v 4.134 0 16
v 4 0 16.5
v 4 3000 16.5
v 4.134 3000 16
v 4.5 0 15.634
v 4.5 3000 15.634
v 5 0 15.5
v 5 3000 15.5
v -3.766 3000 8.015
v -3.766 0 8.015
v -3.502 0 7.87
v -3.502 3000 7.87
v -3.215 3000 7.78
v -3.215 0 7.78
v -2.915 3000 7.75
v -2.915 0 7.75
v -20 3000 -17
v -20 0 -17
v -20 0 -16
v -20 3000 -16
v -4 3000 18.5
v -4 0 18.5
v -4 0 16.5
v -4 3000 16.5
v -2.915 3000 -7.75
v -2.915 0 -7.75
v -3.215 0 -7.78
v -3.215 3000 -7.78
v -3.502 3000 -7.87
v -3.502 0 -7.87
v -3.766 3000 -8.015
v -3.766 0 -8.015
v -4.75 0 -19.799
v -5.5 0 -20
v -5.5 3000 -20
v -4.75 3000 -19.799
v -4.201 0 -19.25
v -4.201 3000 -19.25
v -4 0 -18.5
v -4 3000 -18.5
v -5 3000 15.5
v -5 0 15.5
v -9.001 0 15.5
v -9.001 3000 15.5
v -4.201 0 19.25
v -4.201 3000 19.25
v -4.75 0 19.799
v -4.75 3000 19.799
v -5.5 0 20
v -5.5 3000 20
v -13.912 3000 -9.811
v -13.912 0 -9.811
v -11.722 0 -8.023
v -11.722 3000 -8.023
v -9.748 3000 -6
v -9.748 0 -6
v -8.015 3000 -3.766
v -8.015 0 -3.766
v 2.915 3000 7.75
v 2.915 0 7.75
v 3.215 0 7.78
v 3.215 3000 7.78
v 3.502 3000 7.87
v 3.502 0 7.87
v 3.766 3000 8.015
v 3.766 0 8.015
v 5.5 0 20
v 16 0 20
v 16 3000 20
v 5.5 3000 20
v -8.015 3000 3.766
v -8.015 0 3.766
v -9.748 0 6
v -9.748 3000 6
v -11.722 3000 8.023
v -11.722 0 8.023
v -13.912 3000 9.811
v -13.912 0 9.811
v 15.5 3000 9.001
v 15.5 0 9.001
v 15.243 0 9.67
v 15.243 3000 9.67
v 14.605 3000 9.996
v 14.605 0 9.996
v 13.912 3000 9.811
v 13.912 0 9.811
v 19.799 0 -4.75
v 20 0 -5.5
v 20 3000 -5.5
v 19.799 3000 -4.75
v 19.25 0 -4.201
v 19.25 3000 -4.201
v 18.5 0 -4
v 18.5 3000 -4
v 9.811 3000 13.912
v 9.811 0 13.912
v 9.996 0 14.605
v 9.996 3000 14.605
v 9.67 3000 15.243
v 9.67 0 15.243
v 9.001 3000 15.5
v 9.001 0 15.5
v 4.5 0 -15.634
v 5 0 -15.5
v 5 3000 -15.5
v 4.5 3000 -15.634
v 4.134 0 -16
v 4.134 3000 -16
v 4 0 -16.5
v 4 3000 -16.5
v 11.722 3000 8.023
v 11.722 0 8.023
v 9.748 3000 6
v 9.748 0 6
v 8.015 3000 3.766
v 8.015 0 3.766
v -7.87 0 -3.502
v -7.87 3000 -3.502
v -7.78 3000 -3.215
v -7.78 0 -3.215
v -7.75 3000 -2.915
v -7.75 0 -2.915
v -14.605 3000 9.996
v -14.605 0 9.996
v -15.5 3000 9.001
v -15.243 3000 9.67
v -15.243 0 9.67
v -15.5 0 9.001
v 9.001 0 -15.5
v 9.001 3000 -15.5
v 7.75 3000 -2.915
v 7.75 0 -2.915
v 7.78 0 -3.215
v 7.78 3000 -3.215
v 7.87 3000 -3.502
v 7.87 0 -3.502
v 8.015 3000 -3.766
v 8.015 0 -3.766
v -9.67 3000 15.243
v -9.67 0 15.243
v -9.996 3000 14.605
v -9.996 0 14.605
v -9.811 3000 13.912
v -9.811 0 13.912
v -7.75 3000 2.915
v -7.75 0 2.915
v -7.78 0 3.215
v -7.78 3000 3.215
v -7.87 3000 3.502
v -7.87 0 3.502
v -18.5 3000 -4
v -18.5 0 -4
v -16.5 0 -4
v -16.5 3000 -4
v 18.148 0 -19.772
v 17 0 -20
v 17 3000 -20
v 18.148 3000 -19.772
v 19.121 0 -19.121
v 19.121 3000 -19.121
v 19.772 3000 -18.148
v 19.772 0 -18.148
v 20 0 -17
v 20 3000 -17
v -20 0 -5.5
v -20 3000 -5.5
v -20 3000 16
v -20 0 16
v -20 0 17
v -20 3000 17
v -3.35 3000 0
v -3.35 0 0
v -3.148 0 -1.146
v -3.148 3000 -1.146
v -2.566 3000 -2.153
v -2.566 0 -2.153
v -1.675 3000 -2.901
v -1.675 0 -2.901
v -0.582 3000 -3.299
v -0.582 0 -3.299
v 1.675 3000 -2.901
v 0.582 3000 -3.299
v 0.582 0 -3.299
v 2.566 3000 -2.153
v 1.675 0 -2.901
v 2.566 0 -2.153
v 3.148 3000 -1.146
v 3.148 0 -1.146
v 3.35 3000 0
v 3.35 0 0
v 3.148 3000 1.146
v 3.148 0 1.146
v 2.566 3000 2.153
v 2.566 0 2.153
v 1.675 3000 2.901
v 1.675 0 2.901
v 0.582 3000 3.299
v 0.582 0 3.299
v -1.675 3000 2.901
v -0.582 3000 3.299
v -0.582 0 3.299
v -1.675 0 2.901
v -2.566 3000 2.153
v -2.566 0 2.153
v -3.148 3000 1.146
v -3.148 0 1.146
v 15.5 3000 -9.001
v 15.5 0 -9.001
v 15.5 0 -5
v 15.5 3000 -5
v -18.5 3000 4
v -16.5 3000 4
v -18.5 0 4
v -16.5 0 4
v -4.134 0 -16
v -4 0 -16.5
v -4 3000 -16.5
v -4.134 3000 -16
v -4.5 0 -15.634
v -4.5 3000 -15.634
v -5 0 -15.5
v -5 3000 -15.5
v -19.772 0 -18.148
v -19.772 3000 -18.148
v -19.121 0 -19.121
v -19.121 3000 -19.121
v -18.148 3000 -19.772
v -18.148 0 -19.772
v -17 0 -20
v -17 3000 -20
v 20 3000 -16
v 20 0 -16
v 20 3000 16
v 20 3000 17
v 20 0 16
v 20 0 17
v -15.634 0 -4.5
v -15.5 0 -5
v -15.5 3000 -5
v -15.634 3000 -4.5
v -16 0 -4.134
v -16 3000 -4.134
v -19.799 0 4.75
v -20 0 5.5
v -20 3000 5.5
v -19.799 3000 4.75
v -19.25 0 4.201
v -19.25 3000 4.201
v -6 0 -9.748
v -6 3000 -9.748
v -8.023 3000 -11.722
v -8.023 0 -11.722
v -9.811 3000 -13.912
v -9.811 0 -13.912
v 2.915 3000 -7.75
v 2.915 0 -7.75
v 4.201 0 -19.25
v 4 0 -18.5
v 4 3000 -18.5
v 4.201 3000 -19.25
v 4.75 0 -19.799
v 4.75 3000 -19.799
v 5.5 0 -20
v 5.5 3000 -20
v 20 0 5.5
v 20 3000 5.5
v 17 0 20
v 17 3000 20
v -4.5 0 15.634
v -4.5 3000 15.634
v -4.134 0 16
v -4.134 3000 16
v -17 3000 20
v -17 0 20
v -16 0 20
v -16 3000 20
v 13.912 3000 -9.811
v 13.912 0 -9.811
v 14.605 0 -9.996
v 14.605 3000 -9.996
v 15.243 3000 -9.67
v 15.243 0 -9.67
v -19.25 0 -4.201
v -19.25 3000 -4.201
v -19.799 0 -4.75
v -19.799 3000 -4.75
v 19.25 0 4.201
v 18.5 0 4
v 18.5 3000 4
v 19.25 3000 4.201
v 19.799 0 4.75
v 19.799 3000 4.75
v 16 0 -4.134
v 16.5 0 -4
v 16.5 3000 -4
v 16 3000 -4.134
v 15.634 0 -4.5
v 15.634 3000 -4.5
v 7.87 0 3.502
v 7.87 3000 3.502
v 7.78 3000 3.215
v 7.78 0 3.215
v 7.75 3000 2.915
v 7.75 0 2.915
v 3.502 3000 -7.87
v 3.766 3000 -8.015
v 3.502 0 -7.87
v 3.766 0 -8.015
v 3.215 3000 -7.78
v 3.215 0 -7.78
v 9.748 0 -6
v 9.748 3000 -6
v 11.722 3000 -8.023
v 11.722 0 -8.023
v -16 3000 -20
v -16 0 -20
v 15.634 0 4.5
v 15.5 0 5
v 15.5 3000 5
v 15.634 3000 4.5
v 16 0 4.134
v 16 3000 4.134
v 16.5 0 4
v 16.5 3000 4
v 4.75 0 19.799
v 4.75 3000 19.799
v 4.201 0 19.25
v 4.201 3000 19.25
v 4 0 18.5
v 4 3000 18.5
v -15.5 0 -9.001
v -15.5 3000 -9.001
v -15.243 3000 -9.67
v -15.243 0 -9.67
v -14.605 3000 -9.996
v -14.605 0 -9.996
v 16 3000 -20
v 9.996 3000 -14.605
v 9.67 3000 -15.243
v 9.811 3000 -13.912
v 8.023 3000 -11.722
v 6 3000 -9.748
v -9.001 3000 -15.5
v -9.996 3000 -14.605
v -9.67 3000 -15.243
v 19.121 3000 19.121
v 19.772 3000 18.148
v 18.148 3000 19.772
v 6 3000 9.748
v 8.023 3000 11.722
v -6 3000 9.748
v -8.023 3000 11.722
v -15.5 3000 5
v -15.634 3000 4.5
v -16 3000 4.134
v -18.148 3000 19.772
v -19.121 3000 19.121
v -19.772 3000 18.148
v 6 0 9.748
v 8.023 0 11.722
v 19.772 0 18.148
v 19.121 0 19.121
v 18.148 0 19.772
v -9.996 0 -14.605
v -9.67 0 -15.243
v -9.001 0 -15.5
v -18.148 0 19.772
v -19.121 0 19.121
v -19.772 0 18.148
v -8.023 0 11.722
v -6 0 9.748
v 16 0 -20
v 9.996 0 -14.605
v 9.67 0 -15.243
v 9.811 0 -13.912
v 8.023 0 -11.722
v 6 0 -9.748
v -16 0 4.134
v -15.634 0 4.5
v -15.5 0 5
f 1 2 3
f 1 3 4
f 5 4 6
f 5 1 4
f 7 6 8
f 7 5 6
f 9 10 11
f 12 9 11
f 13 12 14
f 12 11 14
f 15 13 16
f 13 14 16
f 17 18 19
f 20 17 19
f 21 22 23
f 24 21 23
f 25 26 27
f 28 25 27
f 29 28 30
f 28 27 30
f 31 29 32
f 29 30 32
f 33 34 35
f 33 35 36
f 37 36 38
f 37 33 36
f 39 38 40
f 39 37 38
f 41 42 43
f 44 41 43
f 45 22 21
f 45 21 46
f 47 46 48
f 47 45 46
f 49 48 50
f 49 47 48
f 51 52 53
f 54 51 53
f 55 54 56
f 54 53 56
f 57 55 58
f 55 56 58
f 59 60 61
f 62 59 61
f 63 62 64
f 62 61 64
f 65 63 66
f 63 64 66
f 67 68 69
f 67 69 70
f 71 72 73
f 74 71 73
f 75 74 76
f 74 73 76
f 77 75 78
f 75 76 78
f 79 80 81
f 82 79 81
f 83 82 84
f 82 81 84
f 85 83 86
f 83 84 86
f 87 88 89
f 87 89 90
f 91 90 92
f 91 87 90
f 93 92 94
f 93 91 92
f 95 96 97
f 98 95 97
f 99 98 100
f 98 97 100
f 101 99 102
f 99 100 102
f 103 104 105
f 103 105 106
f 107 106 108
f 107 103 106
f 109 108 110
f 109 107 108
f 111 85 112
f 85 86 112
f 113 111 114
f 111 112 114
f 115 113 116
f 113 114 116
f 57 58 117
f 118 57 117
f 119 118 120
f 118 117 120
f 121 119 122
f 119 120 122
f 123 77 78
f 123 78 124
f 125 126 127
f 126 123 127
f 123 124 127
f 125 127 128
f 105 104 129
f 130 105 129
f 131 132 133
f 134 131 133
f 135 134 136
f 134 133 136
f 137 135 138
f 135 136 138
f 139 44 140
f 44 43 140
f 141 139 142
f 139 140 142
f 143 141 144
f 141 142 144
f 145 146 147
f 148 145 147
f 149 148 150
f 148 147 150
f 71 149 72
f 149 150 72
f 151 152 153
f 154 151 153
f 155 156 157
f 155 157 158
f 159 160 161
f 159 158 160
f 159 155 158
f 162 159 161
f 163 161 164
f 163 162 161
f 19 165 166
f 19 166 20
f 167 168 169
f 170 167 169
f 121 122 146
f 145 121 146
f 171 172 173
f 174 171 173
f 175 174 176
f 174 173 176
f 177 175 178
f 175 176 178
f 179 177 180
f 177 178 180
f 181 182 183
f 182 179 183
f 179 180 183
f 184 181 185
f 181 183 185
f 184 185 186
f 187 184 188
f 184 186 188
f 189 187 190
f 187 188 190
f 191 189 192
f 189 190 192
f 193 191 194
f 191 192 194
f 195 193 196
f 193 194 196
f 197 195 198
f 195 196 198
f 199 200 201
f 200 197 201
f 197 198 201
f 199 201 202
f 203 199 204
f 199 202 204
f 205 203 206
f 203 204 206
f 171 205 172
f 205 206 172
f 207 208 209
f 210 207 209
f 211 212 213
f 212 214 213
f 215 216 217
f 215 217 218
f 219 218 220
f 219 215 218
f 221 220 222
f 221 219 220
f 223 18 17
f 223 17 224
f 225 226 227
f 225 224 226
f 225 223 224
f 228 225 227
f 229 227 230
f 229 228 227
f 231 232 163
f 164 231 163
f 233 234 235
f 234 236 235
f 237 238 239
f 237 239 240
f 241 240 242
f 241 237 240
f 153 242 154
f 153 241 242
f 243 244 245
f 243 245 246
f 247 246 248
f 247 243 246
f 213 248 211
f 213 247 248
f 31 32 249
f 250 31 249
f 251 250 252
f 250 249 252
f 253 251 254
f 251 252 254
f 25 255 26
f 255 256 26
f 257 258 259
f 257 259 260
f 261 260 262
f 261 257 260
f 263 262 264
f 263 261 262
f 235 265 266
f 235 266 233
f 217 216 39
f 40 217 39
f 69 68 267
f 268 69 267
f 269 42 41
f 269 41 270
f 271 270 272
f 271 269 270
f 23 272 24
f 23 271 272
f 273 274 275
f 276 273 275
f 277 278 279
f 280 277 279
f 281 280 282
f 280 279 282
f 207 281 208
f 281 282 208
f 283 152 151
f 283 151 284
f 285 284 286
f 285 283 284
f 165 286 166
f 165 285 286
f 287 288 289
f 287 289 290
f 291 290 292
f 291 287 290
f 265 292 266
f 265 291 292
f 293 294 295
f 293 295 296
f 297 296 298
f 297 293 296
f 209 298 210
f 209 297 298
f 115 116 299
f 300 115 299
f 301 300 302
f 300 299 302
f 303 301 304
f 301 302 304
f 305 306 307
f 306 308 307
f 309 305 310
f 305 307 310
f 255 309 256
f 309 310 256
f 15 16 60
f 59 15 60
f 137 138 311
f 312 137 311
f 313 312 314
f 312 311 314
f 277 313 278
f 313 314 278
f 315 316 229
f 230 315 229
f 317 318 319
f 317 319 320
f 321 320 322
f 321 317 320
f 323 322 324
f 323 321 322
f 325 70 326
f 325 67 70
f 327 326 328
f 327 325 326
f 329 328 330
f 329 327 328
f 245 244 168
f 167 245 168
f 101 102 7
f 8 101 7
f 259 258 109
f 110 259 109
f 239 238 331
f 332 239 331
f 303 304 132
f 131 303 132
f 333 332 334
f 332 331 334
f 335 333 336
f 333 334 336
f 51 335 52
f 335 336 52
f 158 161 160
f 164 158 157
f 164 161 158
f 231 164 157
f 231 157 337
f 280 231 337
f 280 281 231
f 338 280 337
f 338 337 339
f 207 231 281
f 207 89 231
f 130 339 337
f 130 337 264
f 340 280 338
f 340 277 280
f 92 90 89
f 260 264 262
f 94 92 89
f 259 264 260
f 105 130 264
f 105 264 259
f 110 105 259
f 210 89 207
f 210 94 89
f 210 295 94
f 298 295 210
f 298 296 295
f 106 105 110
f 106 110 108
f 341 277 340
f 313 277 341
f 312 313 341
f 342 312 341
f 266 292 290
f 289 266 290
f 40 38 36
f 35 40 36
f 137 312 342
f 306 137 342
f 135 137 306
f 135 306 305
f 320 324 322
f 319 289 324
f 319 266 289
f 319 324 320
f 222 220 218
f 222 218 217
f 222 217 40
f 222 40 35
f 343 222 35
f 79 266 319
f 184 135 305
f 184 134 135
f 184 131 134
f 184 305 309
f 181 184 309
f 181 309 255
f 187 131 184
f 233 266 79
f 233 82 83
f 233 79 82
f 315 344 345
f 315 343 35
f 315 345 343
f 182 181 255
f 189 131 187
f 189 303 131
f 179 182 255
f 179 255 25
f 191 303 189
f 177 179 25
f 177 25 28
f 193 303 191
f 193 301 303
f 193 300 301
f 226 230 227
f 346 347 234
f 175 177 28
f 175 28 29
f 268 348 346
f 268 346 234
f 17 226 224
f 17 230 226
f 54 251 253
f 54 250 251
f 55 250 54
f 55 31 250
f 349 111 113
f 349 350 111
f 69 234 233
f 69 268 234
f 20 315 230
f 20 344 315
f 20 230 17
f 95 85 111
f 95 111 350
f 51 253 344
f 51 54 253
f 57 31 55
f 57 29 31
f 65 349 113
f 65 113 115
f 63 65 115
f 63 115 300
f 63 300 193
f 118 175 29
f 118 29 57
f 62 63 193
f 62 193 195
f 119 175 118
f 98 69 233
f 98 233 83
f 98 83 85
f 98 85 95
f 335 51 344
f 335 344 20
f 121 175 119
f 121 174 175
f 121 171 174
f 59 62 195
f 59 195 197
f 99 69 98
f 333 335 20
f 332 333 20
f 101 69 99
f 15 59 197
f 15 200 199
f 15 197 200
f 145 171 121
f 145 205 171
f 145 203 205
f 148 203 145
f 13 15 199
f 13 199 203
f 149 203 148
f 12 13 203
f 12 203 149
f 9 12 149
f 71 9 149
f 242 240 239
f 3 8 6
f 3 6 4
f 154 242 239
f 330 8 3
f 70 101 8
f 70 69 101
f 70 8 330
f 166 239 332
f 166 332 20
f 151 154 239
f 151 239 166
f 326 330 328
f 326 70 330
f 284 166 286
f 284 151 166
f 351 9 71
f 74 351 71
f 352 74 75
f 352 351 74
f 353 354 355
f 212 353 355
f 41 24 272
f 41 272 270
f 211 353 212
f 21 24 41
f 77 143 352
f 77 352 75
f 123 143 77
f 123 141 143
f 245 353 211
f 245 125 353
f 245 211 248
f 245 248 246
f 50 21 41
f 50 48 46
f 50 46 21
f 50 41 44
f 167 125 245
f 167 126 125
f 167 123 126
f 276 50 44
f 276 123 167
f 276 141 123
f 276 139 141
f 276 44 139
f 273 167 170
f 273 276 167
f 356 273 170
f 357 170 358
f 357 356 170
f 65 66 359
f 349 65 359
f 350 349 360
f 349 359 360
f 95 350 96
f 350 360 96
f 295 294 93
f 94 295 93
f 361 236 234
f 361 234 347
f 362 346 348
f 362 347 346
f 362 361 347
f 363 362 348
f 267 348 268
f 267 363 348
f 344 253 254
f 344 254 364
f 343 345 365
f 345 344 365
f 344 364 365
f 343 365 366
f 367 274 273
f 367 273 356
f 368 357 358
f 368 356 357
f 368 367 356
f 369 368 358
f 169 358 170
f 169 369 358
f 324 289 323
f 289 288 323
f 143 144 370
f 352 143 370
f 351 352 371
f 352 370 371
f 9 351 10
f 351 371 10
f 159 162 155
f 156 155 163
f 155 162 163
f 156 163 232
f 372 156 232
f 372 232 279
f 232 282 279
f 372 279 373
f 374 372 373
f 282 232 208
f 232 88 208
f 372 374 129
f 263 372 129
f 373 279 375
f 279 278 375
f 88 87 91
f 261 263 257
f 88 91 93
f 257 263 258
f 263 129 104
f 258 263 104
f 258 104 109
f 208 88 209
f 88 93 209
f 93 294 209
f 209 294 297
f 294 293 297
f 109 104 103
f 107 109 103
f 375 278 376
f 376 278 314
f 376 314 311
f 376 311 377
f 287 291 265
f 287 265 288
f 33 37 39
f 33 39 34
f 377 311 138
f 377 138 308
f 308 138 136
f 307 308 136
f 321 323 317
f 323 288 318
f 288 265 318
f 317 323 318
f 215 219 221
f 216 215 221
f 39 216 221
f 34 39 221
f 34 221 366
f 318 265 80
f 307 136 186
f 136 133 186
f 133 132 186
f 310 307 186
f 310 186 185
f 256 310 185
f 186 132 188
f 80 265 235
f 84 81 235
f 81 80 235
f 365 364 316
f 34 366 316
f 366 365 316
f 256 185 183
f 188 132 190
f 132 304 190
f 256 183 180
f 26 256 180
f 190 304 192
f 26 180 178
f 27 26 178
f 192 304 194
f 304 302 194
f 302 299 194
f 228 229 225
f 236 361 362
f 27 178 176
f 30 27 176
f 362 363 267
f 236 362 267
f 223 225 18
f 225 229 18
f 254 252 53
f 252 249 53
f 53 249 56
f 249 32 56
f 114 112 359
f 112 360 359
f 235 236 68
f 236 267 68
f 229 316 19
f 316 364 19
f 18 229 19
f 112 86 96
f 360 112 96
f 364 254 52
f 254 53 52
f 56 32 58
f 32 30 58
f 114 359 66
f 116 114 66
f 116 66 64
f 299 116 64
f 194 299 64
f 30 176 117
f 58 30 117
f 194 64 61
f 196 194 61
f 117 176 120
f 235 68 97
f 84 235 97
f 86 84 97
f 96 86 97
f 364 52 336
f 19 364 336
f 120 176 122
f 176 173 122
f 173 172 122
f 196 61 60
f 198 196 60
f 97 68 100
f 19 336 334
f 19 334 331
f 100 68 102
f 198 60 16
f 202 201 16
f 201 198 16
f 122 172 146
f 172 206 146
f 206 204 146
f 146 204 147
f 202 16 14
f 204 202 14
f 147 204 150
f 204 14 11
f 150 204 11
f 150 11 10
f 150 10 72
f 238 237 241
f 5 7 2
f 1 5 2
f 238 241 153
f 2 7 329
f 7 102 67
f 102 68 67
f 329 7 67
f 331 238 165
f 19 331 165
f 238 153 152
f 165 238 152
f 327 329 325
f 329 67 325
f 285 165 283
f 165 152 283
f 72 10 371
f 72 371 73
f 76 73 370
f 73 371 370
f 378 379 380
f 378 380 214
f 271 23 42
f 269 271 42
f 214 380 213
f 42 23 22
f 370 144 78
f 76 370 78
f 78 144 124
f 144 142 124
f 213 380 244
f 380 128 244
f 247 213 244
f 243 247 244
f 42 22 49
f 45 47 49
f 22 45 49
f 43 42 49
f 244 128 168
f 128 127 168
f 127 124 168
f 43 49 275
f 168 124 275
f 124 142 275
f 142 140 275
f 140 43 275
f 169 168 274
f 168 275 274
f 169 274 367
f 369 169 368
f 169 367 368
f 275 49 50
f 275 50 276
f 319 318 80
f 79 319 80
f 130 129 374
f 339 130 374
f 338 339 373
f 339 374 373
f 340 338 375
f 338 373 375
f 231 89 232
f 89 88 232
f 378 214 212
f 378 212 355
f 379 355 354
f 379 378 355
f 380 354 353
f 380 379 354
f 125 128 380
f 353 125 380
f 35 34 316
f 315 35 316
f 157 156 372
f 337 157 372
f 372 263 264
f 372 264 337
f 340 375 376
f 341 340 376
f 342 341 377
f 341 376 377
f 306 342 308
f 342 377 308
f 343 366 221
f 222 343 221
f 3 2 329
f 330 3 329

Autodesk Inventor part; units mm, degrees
ref_plane "YZ Plane" through (0, 0, 0) normal (1, 0, 0) x (0, 1, 0)
ref_plane "Start Plane" through (0, 0, 0) normal (0, 1, 0) x (-1, 0, 0)
ref_plane "End Plane" through (0, 3000, 0) normal (0, 1, 0) x (-1, 0, 0)
sketch "Sketch1" plane through (0, 0, 0) normal (0, 1, 0) x (-1, 0, 0)
  circle A0 centre (0, 0) radius 3.35
  line L0 (20, 16) -> (20, 17)
  line L1 (17, 20) -> (16, 20)
  line L2 (4, 18.5) -> (4, 16.5)
  arc A1 (4, 16.5) -> (5, 15.5) centre (5, 16.5) ccw
  line L3 (5, 15.5) -> (9.0014, 15.5)
  arc A2 (9.8106, 13.9125) -> (9.0014, 15.5) centre (9.0014, 14.5) ccw
  arc A3 (3.7664, 8.0149) -> (9.8106, 13.9125) centre (-10.42, 28.6) ccw
  arc A4 (2.9152, 7.75) -> (3.7664, 8.0149) centre (2.9152, 9.25) ccw
  line L4 (2.9152, 7.75) -> (-2.9152, 7.75)
  arc A5 (-3.7664, 8.0149) -> (-2.9152, 7.75) centre (-2.9152, 9.25) ccw
  arc A6 (-9.8106, 13.9125) -> (-3.7664, 8.0149) centre (10.42, 28.6) ccw
  arc A7 (-9.0014, 15.5) -> (-9.8106, 13.9125) centre (-9.0014, 14.5) ccw
  line L5 (-9.0014, 15.5) -> (-5, 15.5)
  arc A8 (-5, 15.5) -> (-4, 16.5) centre (-5, 16.5) ccw
  line L6 (-4, 16.5) -> (-4, 18.5)
  line L7 (-16, 20) -> (-17, 20)
  line L8 (-20, 17) -> (-20, 16)
  line L9 (-18.5, 4) -> (-16.5, 4)
  arc A9 (-16.5, 4) -> (-15.5, 5) centre (-16.5, 5) ccw
  line L10 (-15.5, 5) -> (-15.5, 9.0014)
  arc A10 (-13.9125, 9.8106) -> (-15.5, 9.0014) centre (-14.5, 9.0014) ccw
  arc A11 (-8.0149, 3.7664) -> (-13.9125, 9.8106) centre (-28.6, -10.42) ccw
  arc A12 (-7.75, 2.9152) -> (-8.0149, 3.7664) centre (-9.25, 2.9152) ccw
  line L11 (-7.75, 2.9152) -> (-7.75, -2.9152)
  arc A13 (-8.0149, -3.7664) -> (-7.75, -2.9152) centre (-9.25, -2.9152) ccw
  arc A14 (-13.9125, -9.8106) -> (-8.0149, -3.7664) centre (-28.6, 10.42) ccw
  arc A15 (-15.5, -9.0014) -> (-13.9125, -9.8106) centre (-14.5, -9.0014) ccw
  line L12 (-15.5, -9.0014) -> (-15.5, -5)
  arc A16 (-15.5, -5) -> (-16.5, -4) centre (-16.5, -5) ccw
  line L13 (-16.5, -4) -> (-18.5, -4)
  line L14 (-20, -16) -> (-20, -17)
  line L15 (-17, -20) -> (-16, -20)
  line L16 (-4, -18.5) -> (-4, -16.5)
  arc A17 (-4, -16.5) -> (-5, -15.5) centre (-5, -16.5) ccw
  line L17 (-5, -15.5) -> (-9.0014, -15.5)
  arc A18 (-9.8106, -13.9125) -> (-9.0014, -15.5) centre (-9.0014, -14.5) ccw
  arc A19 (-3.7664, -8.0149) -> (-9.8106, -13.9125) centre (10.42, -28.6) ccw
  arc A20 (-2.9152, -7.75) -> (-3.7664, -8.0149) centre (-2.9152, -9.25) ccw
  line L18 (-2.9152, -7.75) -> (2.9152, -7.75)
  arc A21 (3.7664, -8.0149) -> (2.9152, -7.75) centre (2.9152, -9.25) ccw
  arc A22 (9.8106, -13.9125) -> (3.7664, -8.0149) centre (-10.42, -28.6) ccw
  arc A23 (9.0014, -15.5) -> (9.8106, -13.9125) centre (9.0014, -14.5) ccw
  line L19 (9.0014, -15.5) -> (5, -15.5)
  arc A24 (5, -15.5) -> (4, -16.5) centre (5, -16.5) ccw
  line L20 (4, -16.5) -> (4, -18.5)
  line L21 (16, -20) -> (17, -20)
  line L22 (20, -17) -> (20, -16)
  line L23 (18.5, -4) -> (16.5, -4)
  arc A25 (16.5, -4) -> (15.5, -5) centre (16.5, -5) ccw
  line L24 (15.5, -5) -> (15.5, -9.0014)
  arc A26 (13.9125, -9.8106) -> (15.5, -9.0014) centre (14.5, -9.0014) ccw
  arc A27 (8.0149, -3.7664) -> (13.9125, -9.8106) centre (28.6, 10.42) ccw
  arc A28 (7.75, -2.9152) -> (8.0149, -3.7664) centre (9.25, -2.9152) ccw
  line L25 (7.75, -2.9152) -> (7.75, 2.9152)
  arc A29 (8.0149, 3.7664) -> (7.75, 2.9152) centre (9.25, 2.9152) ccw
  arc A30 (13.9125, 9.8106) -> (8.0149, 3.7664) centre (28.6, -10.42) ccw
  arc A31 (15.5, 9.0014) -> (13.9125, 9.8106) centre (14.5, 9.0014) ccw
  line L26 (15.5, 9.0014) -> (15.5, 5)
  arc A32 (15.5, 5) -> (16.5, 4) centre (16.5, 5) ccw
  line L27 (16.5, 4) -> (18.5, 4)
  line L28 (-17, 20) -> (-5.5, 20)
  line L29 (-20, 5.5) -> (-20, 17)
  arc A33 (-17, 20) -> (-20, 17) centre (-17, 17) ccw
  arc A34 (-20, 5.5) -> (-18.5, 4) centre (-18.5, 5.5) ccw
  arc A35 (-4, 18.5) -> (-5.5, 20) centre (-5.5, 18.5) ccw
  line L30 (5.5, 20) -> (17, 20)
  arc A36 (5.5, 20) -> (4, 18.5) centre (5.5, 18.5) ccw
  line L31 (20, 5.5) -> (20, 17)
  arc A37 (20, 17) -> (17, 20) centre (17, 17) ccw
  arc A38 (18.5, 4) -> (20, 5.5) centre (18.5, 5.5) ccw
  line L32 (5.5, -20) -> (17, -20)
  arc A39 (4, -18.5) -> (5.5, -20) centre (5.5, -18.5) ccw
  line L33 (20, -5.5) -> (20, -17)
  arc A40 (17, -20) -> (20, -17) centre (17, -17) ccw
  arc A41 (20, -5.5) -> (18.5, -4) centre (18.5, -5.5) ccw
  line L34 (-20, -5.5) -> (-20, -17)
  line L35 (-5.5, -20) -> (-17, -20)
  arc A42 (-20, -17) -> (-17, -20) centre (-17, -17) ccw
  arc A43 (-5.5, -20) -> (-4, -18.5) centre (-5.5, -18.5) ccw
  arc A44 (-18.5, -4) -> (-20, -5.5) centre (-18.5, -5.5) ccw
extrude "Body" add sketch "Sketch1" along normal up to surface (3000 mm away) from surface at 0
sketch "Sketch2" plane through (0, 0, 0) normal (0, 1, 0) x (-1, 0, 0)
  line L0 (0, 0) -> (10, 0)
ref_plane "Work Plane3" through (0, 0, 0) normal (0, 0, -1) x (-1, 0, 0)
sketch "Sketch3" plane through (0, 0, 0) normal (0, 0, -1) x (-1, 0, 0)
  line L0 (-2, 0) -> (12, 0)
  line L1 (-2, 3000) -> (12, 3000)
  dimension "d7" = 3000
equation "\"G_OFFSET_START\" = 0"
equation "\"G_OFFSET_END\" = 0"
equation "\"G_L\" = 1200"
properties part number "11-040"
